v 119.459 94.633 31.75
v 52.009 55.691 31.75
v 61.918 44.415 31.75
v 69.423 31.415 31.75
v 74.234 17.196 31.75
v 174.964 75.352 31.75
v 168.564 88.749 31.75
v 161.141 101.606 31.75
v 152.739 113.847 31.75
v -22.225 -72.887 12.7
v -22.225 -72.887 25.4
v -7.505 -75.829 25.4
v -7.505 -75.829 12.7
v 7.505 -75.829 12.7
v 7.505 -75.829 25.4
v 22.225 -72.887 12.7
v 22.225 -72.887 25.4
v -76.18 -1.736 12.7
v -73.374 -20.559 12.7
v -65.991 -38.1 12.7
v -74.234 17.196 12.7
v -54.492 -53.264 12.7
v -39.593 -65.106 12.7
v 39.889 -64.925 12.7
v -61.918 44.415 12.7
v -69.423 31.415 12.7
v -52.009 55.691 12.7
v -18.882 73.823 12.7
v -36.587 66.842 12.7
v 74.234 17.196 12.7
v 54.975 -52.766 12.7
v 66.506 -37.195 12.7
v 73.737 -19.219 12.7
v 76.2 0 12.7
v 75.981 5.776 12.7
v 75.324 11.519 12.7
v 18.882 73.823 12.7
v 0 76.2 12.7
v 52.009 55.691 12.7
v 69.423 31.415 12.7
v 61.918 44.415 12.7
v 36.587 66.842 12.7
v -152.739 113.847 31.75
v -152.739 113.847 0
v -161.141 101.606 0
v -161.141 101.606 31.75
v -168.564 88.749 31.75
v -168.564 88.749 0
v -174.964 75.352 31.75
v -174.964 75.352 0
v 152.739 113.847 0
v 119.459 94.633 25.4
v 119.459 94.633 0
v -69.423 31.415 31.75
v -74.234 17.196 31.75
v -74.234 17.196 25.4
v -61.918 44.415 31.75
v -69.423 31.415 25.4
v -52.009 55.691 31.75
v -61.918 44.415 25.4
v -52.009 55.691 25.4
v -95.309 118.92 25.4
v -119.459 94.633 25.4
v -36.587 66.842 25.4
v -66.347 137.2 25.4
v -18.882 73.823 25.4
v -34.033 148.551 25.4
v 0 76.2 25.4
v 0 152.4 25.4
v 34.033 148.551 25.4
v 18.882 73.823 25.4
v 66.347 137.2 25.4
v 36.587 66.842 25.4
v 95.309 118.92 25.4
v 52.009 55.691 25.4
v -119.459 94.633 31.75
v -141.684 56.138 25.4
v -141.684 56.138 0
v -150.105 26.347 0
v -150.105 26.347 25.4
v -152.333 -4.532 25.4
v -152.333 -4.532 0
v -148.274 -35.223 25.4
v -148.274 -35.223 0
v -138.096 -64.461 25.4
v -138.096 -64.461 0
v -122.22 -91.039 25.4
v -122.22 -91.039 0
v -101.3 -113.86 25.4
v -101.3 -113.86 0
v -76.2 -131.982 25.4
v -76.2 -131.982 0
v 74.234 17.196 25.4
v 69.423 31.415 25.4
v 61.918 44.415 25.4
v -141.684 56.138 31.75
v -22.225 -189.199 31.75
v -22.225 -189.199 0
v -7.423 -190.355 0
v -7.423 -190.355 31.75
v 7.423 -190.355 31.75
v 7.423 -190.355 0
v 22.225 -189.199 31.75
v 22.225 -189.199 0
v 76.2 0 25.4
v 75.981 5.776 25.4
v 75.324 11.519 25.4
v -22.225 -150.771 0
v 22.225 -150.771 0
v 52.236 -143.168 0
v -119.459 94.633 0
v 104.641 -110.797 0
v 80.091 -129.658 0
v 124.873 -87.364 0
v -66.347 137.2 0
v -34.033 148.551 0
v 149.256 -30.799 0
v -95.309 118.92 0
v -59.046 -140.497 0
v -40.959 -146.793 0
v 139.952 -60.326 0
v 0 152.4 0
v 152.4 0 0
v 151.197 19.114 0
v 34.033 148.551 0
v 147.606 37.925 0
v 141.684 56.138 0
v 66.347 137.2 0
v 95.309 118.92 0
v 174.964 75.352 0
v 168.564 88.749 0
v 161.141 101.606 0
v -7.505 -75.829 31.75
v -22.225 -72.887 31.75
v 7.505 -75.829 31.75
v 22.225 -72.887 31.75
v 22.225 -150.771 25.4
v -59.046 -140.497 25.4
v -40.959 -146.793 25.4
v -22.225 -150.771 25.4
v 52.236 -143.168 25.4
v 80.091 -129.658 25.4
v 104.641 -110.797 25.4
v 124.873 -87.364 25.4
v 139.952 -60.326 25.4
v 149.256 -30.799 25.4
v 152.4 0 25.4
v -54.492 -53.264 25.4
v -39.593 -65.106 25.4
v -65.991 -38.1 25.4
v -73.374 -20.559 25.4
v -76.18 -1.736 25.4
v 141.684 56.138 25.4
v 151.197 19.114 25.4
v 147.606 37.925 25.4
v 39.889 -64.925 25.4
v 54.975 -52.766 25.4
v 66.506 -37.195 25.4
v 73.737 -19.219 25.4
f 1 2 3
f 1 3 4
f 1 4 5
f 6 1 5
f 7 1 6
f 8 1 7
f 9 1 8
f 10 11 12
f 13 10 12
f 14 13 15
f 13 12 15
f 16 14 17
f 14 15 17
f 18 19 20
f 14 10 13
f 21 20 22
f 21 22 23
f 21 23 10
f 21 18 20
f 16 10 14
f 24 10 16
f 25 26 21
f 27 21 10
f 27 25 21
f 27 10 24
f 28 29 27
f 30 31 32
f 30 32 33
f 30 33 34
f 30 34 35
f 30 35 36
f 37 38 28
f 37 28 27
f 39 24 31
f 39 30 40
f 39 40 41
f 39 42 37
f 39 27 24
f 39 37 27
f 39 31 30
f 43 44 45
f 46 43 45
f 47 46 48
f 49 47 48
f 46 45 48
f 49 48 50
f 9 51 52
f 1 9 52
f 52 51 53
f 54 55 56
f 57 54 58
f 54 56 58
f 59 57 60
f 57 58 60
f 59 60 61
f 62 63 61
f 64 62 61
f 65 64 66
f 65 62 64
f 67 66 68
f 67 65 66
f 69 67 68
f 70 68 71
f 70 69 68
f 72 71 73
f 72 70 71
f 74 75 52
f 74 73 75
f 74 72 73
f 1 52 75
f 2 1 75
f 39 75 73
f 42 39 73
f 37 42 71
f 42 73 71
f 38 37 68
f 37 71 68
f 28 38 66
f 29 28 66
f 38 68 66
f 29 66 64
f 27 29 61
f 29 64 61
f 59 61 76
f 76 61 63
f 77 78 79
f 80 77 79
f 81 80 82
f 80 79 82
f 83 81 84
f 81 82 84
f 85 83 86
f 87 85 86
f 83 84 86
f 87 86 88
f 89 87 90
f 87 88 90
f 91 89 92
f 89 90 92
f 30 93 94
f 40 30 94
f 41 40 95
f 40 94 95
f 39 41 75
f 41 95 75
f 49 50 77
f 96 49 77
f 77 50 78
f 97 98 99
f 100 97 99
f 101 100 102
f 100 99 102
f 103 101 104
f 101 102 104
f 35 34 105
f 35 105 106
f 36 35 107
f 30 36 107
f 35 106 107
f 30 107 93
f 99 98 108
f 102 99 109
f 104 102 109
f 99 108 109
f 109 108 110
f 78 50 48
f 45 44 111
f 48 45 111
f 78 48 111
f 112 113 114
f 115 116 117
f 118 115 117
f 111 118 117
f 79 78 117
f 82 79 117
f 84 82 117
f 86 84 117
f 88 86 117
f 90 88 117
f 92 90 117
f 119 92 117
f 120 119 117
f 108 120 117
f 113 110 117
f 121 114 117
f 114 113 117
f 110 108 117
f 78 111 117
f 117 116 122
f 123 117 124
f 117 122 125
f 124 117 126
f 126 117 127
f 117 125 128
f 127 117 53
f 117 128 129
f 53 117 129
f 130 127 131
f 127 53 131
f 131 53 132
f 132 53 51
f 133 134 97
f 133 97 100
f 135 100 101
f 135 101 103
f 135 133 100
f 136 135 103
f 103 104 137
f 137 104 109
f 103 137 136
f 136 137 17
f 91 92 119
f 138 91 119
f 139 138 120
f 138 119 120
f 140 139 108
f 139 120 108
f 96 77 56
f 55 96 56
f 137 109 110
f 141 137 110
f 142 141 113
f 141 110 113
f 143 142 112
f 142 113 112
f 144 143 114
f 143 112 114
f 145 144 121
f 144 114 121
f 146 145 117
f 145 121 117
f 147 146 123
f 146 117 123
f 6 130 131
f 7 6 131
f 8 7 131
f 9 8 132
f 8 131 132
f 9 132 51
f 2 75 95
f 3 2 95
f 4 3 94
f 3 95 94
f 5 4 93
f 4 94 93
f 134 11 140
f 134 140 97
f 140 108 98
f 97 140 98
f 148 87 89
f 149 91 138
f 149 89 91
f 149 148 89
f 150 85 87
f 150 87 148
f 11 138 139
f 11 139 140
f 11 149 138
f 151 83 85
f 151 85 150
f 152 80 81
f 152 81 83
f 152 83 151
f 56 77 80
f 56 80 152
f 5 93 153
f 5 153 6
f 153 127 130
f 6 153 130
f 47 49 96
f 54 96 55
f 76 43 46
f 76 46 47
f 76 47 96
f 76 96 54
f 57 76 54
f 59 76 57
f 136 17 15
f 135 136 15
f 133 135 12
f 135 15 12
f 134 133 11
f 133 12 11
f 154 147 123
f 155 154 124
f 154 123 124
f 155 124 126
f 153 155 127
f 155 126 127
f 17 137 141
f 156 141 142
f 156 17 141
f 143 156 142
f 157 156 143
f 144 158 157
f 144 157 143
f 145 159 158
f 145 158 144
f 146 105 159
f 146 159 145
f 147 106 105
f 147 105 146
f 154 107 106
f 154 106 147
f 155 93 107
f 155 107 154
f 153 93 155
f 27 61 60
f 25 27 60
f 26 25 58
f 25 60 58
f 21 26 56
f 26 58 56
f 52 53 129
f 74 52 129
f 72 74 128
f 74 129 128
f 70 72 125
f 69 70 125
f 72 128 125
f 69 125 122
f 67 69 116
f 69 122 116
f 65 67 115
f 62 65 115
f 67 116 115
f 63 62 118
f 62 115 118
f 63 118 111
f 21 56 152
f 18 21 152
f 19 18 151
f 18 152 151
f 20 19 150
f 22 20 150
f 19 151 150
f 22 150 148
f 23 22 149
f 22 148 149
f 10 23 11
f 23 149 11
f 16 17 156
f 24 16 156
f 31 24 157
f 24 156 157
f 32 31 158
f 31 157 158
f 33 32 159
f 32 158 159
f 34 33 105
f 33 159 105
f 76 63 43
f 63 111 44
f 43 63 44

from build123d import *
from build123d import SkipClean  # not in build123d's __all__

# Parameters (mm, degrees)
F1_DEPTH = 25.4
F3_DEPTH = 12.7
F4_DEPTH = 6.35
F5_DEPTH = 31.75


# Not quite as in the source:
# - after a boolean that leaves OpenCascade's solid faulty, fix() repairs it


with BuildPart() as f1:
    # F0 (on Top) → F1 (new body)
    with BuildSketch(Plane.XY):
        with BuildLine():
            ThreePointArc((22.225, -150.7707178964), (115.3534784911, -99.5958583476), (152.4, 0))
            ThreePointArc((152.4, 0), (149.696971962, 28.5758041952), (141.6837718451, 56.1379443491))
            ThreePointArc((141.6837718451, 56.1379443491), (131.9822715367, 76.2), (119.4587718451, 94.6327735473))
            ThreePointArc((119.4587718451, 94.6327735473), (28.5758041952, 149.696971962), (-76.2, 131.9822715367))
            ThreePointArc((-76.2, 131.9822715367), (-99.5958583476, 115.3534784911), (-119.4587718451, 94.6327735473))
            ThreePointArc((-119.4587718451, 94.6327735473), (-131.9822715367, 76.2), (-141.6837718451, 56.1379443491))
            ThreePointArc((-141.6837718451, 56.1379443491), (-143.9292826863, -50.1011136144), (-76.2, -131.9822715367))
            ThreePointArc((-76.2, -131.9822715367), (-50.1011136144, -143.9292826863), (-22.225, -150.7707178964))
            ThreePointArc((-22.225, -150.7707178964), (0, -152.4), (22.225, -150.7707178964))
        make_face()
    extrude(amount=F1_DEPTH)

    # F2 (on face) → F3 (cut)
    with BuildSketch(Plane.XY.offset(25.4)):
        with BuildLine():
            ThreePointArc((22.225, -72.8868257986), (61.2371823323, -45.3480705212), (76.2, 0))
            ThreePointArc((76.2, 0), (75.7069908166, 8.6539899179), (74.2343427428, 17.1959983002))
            ThreePointArc((74.2343427428, 17.1959983002), (65.9911357684, 38.1), (52.0093427428, 55.6908274984))
            ThreePointArc((52.0093427428, 55.6908274984), (0, 76.2), (-52.0093427428, 55.6908274984))
            ThreePointArc((-52.0093427428, 55.6908274984), (-65.9911357684, 38.1), (-74.2343427428, 17.1959983002))
            ThreePointArc((-74.2343427428, 17.1959983002), (-65.9911357684, -38.1), (-22.225, -72.8868257986))
            ThreePointArc((-22.225, -72.8868257986), (0, -76.2), (22.225, -72.8868257986))
        make_face()
    extrude(amount=-F3_DEPTH, mode=Mode.SUBTRACT)

    # F2 (on face) → F4 (join)
    with BuildSketch(Plane.XY.offset(25.4)):
        with BuildLine():
            ThreePointArc((-74.2343427428, 17.1959983002), (-65.9911357684, 38.1), (-52.0093427428, 55.6908274984))
            Line((-52.0093427428, 55.6908274984), (-119.4587718451, 94.6327735473))
            ThreePointArc((-119.4587718451, 94.6327735473), (-131.9822715367, 76.2), (-141.6837718451, 56.1379443491))
            Line((-141.6837718451, 56.1379443491), (-74.2343427428, 17.1959983002))
        make_face()
        with BuildLine():
            Line((22.225, -150.7707178964), (22.225, -72.8868257986))
            ThreePointArc((22.225, -72.8868257986), (0, -76.2), (-22.225, -72.8868257986))
            Line((-22.225, -72.8868257986), (-22.225, -150.7707178964))
            ThreePointArc((-22.225, -150.7707178964), (0, -152.4), (22.225, -150.7707178964))
        make_face()
        with BuildLine():
            ThreePointArc((52.0093427428, 55.6908274984), (65.9911357684, 38.1), (74.2343427428, 17.1959983002))
            Line((74.2343427428, 17.1959983002), (141.6837718451, 56.1379443491))
            ThreePointArc((141.6837718451, 56.1379443491), (131.9822715367, 76.2), (119.4587718451, 94.6327735473))
            Line((119.4587718451, 94.6327735473), (52.0093427428, 55.6908274984))
        make_face()
    with SkipClean():  # cleaning this boolean's faces spoils the solid; the shape is the same uncleaned
        extrude(amount=F4_DEPTH)

    # F0 (on Top) → F5 (join)
    with BuildSketch(Plane.XY):
        with BuildLine():
            ThreePointArc((119.4587718451, 94.6327735473), (131.9822715367, 76.2), (141.6837718451, 56.1379443491))
            Line((141.6837718451, 56.1379443491), (174.9637268225, 75.3521353139))
            ThreePointArc((174.9637268225, 75.3521353139), (164.9778394209, 95.25), (152.7387268225, 113.8469645122))
            Line((152.7387268225, 113.8469645122), (119.4587718451, 94.6327735473))
        make_face()
        with BuildLine():
            ThreePointArc((-141.6837718451, 56.1379443491), (-131.9822715367, 76.2), (-119.4587718451, 94.6327735473))
            Line((-119.4587718451, 94.6327735473), (-152.7387268225, 113.8469645122))
            ThreePointArc((-152.7387268225, 113.8469645122), (-164.9778394209, 95.25), (-174.9637268225, 75.3521353139))
            Line((-174.9637268225, 75.3521353139), (-141.6837718451, 56.1379443491))
        make_face()
        with BuildLine():
            Line((22.225, -189.1990998261), (22.225, -150.7707178964))
            ThreePointArc((22.225, -150.7707178964), (0, -152.4), (-22.225, -150.7707178964))
            Line((-22.225, -150.7707178964), (-22.225, -189.1990998261))
            ThreePointArc((-22.225, -189.1990998261), (0, -190.5), (22.225, -189.1990998261))
        make_face()
    extrude(amount=F5_DEPTH)

    add(f1.part.fix(), mode=Mode.REPLACE)


solid = f1.part
